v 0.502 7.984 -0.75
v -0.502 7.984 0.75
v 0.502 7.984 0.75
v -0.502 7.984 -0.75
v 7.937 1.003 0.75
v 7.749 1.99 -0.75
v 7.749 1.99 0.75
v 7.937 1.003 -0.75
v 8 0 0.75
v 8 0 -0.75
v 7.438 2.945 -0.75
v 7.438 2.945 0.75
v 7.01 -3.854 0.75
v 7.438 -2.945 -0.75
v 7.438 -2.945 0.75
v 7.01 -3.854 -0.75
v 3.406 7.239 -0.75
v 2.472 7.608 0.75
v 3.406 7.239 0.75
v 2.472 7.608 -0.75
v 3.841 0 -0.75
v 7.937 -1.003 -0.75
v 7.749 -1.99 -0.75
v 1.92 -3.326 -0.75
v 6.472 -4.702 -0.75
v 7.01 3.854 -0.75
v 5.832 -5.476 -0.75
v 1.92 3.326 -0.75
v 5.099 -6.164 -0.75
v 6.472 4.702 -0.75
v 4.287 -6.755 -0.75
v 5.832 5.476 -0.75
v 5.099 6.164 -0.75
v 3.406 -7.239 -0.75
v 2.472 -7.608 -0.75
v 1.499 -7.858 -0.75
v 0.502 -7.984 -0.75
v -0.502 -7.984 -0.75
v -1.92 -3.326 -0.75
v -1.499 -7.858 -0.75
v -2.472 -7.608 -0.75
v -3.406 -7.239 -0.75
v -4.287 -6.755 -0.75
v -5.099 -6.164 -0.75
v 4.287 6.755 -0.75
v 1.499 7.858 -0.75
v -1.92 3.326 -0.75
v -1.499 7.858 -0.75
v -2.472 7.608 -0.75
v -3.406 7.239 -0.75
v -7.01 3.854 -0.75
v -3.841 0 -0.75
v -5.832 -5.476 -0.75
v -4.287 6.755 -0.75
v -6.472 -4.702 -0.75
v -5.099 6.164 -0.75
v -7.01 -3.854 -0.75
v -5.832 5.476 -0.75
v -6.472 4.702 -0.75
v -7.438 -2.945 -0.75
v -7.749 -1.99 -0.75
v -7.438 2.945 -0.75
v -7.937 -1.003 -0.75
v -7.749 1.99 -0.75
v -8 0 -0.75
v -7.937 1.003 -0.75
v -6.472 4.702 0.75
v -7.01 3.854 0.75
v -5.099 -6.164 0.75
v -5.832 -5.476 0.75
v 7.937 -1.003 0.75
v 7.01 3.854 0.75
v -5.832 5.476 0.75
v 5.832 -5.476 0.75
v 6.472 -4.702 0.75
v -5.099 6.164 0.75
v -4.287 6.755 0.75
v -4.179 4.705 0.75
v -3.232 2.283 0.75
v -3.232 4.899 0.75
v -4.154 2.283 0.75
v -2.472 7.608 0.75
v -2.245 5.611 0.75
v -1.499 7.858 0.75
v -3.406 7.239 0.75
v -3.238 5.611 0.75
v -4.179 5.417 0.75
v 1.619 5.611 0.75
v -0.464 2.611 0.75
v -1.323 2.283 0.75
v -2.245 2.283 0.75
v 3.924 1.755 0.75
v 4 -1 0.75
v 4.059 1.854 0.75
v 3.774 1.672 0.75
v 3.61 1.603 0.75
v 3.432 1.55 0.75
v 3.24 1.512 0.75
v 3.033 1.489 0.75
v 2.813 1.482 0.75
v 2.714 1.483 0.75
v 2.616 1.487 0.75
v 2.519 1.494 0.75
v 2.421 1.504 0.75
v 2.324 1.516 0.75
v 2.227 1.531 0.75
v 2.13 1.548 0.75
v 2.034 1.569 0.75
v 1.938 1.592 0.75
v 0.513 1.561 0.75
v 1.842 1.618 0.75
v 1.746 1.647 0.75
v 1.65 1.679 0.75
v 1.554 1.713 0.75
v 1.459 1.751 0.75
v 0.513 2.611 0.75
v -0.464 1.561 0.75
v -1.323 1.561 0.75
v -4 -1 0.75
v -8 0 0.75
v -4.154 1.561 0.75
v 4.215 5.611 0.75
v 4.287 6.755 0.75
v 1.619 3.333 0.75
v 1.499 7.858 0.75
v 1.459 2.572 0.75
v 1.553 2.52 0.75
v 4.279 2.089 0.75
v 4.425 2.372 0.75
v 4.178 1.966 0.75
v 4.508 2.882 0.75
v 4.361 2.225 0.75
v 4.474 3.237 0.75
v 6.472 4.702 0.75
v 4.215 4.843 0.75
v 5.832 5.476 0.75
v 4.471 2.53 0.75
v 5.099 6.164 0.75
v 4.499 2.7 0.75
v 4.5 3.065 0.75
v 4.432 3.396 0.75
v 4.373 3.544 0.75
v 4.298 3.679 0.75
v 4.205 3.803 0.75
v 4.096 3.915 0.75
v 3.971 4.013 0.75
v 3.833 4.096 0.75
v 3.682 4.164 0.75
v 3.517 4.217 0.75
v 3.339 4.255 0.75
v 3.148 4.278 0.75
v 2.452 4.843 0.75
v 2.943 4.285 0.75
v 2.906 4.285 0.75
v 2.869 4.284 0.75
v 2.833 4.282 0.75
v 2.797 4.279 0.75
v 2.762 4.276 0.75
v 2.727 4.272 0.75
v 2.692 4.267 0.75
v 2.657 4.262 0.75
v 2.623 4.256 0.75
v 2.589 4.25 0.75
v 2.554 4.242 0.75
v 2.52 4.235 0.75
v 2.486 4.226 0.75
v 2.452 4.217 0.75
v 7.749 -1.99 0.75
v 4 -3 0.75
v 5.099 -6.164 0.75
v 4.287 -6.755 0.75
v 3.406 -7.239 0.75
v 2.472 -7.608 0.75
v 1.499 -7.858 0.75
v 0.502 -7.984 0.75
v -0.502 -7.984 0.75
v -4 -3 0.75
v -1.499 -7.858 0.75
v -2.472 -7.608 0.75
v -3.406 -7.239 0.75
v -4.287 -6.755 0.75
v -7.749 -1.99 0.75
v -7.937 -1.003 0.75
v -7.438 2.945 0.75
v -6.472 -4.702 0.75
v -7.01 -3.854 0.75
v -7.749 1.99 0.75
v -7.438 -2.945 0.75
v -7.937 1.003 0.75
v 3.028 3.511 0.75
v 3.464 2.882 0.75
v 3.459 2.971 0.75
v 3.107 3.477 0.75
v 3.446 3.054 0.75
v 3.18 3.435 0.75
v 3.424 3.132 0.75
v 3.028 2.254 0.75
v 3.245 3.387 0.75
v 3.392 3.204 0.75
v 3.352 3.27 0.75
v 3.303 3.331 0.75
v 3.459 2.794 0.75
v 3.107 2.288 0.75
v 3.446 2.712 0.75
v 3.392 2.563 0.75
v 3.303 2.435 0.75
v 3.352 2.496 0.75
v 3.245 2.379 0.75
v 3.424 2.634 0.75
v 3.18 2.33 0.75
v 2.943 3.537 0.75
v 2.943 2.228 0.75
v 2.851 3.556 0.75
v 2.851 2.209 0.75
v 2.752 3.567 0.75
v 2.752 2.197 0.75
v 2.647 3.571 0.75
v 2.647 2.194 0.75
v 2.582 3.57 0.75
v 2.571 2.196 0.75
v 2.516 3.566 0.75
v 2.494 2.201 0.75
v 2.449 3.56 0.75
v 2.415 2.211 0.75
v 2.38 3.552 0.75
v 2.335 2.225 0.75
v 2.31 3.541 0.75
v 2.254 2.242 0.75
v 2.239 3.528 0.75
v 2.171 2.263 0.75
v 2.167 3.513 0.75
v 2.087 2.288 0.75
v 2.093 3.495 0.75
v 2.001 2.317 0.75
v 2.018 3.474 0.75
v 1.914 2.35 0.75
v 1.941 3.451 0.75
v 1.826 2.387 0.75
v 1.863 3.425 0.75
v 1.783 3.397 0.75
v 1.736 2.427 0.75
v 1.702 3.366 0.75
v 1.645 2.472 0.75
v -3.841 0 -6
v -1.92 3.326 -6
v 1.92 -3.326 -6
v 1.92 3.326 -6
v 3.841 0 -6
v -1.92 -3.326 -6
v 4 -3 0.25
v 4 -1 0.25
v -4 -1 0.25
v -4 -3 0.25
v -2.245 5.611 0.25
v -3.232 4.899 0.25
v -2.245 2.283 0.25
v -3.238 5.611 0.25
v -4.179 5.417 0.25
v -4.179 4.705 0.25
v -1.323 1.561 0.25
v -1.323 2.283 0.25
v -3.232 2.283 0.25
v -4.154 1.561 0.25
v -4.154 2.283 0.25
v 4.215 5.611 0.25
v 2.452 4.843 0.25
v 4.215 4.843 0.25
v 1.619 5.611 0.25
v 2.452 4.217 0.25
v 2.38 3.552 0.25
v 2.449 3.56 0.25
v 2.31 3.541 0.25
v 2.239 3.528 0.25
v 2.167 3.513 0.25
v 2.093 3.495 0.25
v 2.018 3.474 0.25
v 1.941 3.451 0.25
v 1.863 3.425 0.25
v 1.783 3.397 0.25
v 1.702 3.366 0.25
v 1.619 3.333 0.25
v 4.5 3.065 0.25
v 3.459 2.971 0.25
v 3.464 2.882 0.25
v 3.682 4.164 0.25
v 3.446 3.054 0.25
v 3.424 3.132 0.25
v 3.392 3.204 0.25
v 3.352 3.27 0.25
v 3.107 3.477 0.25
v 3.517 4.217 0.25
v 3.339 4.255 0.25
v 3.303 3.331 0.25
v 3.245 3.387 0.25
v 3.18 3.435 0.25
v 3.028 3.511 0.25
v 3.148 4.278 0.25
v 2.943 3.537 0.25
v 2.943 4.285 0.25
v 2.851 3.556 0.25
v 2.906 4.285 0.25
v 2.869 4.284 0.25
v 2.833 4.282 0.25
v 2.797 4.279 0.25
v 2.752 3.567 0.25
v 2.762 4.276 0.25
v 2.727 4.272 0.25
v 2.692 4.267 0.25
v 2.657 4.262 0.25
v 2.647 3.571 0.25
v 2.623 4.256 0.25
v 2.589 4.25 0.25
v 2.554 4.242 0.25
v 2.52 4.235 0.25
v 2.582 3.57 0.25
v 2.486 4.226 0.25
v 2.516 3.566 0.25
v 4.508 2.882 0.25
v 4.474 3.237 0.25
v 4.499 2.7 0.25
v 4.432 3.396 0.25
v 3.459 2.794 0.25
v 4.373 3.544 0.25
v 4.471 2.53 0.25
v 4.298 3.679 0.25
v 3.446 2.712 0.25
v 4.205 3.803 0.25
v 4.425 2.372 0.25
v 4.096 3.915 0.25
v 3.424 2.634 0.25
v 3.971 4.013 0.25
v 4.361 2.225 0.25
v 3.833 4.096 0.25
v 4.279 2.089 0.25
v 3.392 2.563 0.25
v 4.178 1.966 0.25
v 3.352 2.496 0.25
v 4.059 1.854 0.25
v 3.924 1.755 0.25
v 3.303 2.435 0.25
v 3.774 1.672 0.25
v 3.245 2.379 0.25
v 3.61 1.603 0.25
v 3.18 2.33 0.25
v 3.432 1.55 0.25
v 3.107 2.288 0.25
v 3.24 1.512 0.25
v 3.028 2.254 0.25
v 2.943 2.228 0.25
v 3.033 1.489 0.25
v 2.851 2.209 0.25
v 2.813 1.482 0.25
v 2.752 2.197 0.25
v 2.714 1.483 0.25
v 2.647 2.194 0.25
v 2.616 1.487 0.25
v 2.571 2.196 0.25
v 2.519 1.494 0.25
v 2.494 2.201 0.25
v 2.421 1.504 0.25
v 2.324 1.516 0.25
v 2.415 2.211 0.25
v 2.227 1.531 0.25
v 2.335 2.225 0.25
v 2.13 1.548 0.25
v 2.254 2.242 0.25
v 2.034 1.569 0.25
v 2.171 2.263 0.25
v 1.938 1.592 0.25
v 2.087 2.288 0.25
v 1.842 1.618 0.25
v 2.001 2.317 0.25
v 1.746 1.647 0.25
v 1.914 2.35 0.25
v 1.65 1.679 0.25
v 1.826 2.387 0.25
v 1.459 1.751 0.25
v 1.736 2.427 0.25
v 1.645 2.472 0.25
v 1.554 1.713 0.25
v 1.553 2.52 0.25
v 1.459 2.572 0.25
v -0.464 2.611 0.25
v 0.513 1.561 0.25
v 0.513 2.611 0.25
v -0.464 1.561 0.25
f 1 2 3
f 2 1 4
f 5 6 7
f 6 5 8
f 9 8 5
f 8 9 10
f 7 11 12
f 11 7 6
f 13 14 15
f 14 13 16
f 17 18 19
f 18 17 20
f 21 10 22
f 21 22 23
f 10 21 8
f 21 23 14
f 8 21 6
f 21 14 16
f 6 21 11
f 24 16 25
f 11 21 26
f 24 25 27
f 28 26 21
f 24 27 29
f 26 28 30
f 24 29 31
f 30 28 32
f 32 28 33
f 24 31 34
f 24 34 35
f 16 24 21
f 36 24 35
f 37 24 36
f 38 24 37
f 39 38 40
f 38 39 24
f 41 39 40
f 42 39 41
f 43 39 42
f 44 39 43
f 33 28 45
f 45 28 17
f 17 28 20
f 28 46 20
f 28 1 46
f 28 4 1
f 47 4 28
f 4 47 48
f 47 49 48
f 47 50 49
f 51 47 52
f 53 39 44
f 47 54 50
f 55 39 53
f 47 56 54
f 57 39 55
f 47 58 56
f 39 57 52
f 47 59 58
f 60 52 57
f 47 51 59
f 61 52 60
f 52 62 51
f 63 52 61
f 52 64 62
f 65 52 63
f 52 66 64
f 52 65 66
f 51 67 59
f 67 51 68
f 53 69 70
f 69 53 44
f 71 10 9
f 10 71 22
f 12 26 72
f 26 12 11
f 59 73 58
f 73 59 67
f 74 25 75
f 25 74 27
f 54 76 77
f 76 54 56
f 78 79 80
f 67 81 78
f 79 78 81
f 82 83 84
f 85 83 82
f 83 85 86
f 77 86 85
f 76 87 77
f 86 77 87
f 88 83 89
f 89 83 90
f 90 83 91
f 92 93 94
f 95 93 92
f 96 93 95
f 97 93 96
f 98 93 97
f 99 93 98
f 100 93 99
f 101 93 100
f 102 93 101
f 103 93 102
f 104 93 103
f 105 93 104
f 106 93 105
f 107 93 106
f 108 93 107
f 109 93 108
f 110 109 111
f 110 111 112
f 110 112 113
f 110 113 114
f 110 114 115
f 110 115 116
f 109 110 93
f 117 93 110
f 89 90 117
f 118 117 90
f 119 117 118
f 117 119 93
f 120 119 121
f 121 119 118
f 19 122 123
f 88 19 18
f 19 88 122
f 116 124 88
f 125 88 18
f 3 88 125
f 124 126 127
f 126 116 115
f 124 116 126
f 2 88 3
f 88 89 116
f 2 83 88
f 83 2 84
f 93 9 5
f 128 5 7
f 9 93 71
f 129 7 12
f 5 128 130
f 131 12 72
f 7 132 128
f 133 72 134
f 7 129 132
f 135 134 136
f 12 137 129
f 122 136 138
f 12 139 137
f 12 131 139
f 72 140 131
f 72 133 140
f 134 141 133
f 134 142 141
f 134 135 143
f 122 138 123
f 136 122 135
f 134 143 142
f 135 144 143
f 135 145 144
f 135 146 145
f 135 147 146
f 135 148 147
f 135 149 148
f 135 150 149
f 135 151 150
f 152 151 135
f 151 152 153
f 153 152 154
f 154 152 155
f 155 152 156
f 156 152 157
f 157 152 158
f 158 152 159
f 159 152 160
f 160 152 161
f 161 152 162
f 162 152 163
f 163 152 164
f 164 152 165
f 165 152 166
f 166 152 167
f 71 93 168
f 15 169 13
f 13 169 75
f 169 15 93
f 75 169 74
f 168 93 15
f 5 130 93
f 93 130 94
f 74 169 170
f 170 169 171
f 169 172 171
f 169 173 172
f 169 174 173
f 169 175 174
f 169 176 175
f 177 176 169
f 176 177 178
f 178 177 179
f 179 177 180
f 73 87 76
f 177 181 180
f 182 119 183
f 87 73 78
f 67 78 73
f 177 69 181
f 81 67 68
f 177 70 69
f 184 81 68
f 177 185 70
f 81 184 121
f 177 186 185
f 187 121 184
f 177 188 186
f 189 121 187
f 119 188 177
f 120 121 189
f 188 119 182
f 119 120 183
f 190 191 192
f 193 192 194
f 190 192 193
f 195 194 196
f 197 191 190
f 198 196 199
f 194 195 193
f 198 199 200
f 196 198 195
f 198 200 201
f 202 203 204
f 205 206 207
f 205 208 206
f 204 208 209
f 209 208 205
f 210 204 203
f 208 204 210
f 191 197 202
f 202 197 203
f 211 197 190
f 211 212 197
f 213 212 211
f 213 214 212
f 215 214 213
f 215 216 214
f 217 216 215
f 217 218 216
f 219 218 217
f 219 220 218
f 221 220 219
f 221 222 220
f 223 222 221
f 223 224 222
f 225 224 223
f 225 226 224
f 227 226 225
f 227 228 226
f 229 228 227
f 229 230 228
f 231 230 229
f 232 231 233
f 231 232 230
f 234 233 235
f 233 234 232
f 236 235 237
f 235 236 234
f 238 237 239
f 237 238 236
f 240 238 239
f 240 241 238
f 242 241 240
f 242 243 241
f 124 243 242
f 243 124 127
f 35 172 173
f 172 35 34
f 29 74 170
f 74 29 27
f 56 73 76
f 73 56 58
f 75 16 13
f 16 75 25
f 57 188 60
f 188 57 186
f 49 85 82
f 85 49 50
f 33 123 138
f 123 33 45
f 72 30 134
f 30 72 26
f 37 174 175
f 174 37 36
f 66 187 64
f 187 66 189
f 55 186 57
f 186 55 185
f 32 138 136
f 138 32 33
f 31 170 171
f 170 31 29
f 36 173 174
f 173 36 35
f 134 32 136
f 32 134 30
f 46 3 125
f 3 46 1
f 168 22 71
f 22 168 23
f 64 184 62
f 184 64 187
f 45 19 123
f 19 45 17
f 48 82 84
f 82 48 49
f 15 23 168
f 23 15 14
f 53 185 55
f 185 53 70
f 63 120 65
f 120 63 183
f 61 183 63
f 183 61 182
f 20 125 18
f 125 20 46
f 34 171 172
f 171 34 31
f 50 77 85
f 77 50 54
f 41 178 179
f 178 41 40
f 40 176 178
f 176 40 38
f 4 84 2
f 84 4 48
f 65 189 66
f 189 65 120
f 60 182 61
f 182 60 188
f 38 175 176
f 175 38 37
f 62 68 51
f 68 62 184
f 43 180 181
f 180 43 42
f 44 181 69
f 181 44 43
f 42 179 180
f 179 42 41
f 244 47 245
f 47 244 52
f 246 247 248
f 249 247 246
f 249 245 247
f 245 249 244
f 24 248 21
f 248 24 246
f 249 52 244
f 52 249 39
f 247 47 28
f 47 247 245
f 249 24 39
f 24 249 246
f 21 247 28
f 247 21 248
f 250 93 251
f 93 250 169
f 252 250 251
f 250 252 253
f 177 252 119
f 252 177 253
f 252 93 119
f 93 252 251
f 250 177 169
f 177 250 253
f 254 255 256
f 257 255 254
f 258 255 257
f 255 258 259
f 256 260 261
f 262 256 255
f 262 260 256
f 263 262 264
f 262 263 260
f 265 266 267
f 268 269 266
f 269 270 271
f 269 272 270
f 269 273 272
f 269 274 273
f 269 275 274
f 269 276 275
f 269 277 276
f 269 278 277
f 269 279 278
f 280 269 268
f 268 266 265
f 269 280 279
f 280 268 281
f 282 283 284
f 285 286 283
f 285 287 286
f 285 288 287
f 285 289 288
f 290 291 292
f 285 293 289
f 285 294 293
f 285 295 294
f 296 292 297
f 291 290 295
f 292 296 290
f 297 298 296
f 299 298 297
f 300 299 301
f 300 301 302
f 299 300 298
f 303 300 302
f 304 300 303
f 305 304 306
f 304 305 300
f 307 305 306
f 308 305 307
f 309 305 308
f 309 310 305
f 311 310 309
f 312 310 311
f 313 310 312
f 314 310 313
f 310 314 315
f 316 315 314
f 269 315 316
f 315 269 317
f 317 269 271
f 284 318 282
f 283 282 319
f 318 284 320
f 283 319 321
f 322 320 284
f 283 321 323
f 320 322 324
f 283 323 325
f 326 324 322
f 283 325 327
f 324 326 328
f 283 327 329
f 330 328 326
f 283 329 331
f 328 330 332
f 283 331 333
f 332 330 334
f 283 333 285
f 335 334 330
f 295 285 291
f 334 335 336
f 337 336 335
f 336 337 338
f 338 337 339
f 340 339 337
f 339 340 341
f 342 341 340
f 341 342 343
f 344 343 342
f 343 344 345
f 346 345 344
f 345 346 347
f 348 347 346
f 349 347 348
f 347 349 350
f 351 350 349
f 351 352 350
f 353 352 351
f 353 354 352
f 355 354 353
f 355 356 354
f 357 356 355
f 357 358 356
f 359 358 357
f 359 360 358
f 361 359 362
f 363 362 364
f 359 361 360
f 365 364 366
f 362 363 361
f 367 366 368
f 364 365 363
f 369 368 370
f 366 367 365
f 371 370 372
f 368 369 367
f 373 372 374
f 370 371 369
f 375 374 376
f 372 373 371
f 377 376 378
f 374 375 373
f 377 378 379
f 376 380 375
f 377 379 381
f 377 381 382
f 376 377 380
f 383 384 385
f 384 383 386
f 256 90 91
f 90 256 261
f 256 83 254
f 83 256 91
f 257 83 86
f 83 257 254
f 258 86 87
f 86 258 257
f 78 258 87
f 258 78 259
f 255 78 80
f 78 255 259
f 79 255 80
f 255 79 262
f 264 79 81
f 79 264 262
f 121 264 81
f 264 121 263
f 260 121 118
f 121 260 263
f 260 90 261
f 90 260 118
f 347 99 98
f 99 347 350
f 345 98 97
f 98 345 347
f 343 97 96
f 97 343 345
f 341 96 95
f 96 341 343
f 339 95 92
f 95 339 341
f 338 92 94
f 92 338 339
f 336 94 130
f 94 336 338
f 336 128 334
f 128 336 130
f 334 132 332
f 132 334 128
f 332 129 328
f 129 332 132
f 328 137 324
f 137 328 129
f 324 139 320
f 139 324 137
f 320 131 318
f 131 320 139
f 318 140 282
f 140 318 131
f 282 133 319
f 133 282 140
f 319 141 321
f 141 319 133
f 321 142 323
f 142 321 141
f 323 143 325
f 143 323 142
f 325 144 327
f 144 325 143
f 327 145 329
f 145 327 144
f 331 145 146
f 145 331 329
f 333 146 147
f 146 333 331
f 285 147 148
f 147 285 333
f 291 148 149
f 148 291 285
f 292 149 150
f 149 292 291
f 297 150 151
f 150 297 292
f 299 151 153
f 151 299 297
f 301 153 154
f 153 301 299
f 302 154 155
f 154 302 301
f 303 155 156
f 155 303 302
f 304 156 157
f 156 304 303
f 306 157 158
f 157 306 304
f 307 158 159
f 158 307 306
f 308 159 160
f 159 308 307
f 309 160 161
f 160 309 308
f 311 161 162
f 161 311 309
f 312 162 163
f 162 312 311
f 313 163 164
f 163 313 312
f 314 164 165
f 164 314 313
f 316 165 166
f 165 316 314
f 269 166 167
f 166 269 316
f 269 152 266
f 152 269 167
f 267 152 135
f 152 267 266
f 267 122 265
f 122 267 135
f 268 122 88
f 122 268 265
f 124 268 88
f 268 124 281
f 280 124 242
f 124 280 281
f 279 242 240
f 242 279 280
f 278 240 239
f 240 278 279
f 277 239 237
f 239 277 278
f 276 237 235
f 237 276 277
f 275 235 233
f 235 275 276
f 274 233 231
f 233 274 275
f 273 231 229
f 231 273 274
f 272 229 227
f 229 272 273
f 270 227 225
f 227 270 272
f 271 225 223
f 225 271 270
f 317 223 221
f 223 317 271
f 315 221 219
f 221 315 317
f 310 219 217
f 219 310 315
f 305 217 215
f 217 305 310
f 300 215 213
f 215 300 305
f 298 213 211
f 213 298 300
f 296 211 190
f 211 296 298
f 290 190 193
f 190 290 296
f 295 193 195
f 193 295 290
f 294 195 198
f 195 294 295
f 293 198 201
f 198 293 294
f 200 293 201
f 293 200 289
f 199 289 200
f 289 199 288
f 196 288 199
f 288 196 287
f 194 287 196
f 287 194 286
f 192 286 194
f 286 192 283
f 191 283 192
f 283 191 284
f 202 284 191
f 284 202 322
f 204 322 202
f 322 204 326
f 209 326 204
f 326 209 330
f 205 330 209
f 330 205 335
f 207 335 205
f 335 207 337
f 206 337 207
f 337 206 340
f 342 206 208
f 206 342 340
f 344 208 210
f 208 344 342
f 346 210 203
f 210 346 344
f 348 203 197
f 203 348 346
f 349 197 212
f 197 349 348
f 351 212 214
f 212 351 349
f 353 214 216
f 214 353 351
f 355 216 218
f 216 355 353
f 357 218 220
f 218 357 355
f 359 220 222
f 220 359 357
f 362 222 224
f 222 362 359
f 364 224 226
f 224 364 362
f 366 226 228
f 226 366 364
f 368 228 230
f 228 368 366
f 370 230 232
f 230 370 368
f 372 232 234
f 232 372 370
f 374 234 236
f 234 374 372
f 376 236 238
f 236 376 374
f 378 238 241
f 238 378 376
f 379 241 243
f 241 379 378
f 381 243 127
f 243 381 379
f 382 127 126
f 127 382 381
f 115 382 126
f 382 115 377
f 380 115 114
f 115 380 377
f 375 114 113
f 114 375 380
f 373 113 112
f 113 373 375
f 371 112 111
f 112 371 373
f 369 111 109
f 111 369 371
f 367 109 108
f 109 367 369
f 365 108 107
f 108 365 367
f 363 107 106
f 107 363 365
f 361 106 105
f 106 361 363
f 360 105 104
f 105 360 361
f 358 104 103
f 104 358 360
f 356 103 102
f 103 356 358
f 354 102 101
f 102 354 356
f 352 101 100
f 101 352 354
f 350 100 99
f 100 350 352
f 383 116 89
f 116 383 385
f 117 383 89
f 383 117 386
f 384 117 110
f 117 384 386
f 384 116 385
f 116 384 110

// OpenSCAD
$fn = 50;


difference() {
	union() {
		translate(v = [0, 0, -0.7500000000]) {
			cylinder(h = 1.5000000000, r = 8.0000000000);
		}
		translate(v = [0, 0, -6]) {
			linear_extrude(height = 6) {
				polygon(points = [[3.8408550000, 0.0000000000], [1.9204275000, 3.3262780023], [-1.9204275000, 3.3262780023], [-3.8408550000, 0.0000000000], [-1.9204275000, -3.3262780023], [1.9204275000, -3.3262780023]]);
			}
		}
	}
	union() {
		#translate(v = [-4.0000000000, -3.0000000000, 0.2500000000]) {
			cube(size = [8, 2, 0.5000000000]);
		}
		#translate(v = [0, 3.5000000000, 0.2500000000]) {
			linear_extrude(height = 0.5000000000) {
				text(font = "SegoiUI:Bold", halign = "center", size = 4, text = "1.5", valign = "center");
			}
		}
	}
}
